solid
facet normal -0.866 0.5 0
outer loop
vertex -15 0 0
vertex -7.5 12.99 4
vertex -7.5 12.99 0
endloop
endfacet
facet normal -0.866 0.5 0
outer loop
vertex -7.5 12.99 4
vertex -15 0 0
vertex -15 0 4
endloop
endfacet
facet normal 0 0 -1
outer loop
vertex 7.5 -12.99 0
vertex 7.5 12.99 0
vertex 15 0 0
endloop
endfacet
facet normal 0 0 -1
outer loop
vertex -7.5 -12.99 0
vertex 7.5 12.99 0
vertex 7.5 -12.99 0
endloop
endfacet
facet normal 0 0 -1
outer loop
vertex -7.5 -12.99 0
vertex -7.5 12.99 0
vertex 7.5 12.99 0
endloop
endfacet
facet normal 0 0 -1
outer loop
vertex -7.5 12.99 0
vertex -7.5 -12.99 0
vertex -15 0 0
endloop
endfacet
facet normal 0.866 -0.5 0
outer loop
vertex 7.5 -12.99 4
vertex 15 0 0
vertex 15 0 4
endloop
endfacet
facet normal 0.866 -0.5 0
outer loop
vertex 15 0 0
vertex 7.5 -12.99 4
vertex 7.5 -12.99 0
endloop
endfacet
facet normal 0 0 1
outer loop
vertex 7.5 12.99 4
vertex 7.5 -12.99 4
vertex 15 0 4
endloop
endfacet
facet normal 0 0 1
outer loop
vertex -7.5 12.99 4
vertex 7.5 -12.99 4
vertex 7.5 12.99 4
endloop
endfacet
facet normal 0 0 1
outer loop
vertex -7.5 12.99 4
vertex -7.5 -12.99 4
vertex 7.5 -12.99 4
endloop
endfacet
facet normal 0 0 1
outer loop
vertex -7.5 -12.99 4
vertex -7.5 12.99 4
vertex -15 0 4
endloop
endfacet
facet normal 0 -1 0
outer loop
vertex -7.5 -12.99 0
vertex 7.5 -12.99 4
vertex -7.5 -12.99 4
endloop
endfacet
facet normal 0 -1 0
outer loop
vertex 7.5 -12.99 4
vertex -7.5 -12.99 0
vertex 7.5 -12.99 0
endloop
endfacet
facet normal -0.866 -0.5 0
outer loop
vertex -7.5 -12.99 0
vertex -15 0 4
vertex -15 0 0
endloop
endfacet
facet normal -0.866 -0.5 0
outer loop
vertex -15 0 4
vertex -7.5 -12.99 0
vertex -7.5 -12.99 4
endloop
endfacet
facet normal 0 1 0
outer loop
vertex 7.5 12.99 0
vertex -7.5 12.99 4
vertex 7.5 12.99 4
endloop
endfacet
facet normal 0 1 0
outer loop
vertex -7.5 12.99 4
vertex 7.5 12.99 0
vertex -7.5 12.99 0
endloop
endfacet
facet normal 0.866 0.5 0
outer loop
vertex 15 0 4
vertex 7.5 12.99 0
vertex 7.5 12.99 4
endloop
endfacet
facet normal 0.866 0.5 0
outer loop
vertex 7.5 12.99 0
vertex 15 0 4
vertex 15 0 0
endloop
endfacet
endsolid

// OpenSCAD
// resolution bezier curve
deltat = 0.02;

// cubic bexier curve function
function cubic_bezier(p0,p1,p2,p3) = [for (t=[0:deltat:1+deltat]) pow(1-t,3)*p0+3*pow((1-t),2)*t*p1+3*(1-t)*pow(t,2)*p2+pow(t,3)*p3];
    
function reverse(v) = [for (i=[len(v)-1:-1:0]) v[i]];
function delete_first(v) = [for (i=[1:len(v)-1]) v[i]]; 


p10 = [-4.75,4.0 + 1/128];
p11 = [-2.75,4.0];
p12 = [-4.8,2.2];
p13 = [0.0,2.0 + 1/128];

p20 = [4.75,4.0 + 1/128];
p21 = [2.75,4.0];
p22 = [4.8,2.2];
p23 = [0.0,2.0 + 1/128];



// bezier curve for cx
points_left = cubic_bezier(p10, p11, p12, p13);
points_right = reverse(cubic_bezier(p20, p21, p22, p23));
points = concat(points_left, points_right);


difference()
{
    color("Peru", 1.0)
    {
        // hexagon base
        linear_extrude(height = 4, center = false, convexity = 10, twist = 0)
        circle(r=15, $fn=6);
    }
    
    color("Blue", 1.0)
    {
        // canal shape
        translate([22.5,-12.99,0])
        rotate_extrude(angle=360, convexity=10, $fn=90)
        translate([-22.5,0,0])
        polygon(points);
    }
    
}
